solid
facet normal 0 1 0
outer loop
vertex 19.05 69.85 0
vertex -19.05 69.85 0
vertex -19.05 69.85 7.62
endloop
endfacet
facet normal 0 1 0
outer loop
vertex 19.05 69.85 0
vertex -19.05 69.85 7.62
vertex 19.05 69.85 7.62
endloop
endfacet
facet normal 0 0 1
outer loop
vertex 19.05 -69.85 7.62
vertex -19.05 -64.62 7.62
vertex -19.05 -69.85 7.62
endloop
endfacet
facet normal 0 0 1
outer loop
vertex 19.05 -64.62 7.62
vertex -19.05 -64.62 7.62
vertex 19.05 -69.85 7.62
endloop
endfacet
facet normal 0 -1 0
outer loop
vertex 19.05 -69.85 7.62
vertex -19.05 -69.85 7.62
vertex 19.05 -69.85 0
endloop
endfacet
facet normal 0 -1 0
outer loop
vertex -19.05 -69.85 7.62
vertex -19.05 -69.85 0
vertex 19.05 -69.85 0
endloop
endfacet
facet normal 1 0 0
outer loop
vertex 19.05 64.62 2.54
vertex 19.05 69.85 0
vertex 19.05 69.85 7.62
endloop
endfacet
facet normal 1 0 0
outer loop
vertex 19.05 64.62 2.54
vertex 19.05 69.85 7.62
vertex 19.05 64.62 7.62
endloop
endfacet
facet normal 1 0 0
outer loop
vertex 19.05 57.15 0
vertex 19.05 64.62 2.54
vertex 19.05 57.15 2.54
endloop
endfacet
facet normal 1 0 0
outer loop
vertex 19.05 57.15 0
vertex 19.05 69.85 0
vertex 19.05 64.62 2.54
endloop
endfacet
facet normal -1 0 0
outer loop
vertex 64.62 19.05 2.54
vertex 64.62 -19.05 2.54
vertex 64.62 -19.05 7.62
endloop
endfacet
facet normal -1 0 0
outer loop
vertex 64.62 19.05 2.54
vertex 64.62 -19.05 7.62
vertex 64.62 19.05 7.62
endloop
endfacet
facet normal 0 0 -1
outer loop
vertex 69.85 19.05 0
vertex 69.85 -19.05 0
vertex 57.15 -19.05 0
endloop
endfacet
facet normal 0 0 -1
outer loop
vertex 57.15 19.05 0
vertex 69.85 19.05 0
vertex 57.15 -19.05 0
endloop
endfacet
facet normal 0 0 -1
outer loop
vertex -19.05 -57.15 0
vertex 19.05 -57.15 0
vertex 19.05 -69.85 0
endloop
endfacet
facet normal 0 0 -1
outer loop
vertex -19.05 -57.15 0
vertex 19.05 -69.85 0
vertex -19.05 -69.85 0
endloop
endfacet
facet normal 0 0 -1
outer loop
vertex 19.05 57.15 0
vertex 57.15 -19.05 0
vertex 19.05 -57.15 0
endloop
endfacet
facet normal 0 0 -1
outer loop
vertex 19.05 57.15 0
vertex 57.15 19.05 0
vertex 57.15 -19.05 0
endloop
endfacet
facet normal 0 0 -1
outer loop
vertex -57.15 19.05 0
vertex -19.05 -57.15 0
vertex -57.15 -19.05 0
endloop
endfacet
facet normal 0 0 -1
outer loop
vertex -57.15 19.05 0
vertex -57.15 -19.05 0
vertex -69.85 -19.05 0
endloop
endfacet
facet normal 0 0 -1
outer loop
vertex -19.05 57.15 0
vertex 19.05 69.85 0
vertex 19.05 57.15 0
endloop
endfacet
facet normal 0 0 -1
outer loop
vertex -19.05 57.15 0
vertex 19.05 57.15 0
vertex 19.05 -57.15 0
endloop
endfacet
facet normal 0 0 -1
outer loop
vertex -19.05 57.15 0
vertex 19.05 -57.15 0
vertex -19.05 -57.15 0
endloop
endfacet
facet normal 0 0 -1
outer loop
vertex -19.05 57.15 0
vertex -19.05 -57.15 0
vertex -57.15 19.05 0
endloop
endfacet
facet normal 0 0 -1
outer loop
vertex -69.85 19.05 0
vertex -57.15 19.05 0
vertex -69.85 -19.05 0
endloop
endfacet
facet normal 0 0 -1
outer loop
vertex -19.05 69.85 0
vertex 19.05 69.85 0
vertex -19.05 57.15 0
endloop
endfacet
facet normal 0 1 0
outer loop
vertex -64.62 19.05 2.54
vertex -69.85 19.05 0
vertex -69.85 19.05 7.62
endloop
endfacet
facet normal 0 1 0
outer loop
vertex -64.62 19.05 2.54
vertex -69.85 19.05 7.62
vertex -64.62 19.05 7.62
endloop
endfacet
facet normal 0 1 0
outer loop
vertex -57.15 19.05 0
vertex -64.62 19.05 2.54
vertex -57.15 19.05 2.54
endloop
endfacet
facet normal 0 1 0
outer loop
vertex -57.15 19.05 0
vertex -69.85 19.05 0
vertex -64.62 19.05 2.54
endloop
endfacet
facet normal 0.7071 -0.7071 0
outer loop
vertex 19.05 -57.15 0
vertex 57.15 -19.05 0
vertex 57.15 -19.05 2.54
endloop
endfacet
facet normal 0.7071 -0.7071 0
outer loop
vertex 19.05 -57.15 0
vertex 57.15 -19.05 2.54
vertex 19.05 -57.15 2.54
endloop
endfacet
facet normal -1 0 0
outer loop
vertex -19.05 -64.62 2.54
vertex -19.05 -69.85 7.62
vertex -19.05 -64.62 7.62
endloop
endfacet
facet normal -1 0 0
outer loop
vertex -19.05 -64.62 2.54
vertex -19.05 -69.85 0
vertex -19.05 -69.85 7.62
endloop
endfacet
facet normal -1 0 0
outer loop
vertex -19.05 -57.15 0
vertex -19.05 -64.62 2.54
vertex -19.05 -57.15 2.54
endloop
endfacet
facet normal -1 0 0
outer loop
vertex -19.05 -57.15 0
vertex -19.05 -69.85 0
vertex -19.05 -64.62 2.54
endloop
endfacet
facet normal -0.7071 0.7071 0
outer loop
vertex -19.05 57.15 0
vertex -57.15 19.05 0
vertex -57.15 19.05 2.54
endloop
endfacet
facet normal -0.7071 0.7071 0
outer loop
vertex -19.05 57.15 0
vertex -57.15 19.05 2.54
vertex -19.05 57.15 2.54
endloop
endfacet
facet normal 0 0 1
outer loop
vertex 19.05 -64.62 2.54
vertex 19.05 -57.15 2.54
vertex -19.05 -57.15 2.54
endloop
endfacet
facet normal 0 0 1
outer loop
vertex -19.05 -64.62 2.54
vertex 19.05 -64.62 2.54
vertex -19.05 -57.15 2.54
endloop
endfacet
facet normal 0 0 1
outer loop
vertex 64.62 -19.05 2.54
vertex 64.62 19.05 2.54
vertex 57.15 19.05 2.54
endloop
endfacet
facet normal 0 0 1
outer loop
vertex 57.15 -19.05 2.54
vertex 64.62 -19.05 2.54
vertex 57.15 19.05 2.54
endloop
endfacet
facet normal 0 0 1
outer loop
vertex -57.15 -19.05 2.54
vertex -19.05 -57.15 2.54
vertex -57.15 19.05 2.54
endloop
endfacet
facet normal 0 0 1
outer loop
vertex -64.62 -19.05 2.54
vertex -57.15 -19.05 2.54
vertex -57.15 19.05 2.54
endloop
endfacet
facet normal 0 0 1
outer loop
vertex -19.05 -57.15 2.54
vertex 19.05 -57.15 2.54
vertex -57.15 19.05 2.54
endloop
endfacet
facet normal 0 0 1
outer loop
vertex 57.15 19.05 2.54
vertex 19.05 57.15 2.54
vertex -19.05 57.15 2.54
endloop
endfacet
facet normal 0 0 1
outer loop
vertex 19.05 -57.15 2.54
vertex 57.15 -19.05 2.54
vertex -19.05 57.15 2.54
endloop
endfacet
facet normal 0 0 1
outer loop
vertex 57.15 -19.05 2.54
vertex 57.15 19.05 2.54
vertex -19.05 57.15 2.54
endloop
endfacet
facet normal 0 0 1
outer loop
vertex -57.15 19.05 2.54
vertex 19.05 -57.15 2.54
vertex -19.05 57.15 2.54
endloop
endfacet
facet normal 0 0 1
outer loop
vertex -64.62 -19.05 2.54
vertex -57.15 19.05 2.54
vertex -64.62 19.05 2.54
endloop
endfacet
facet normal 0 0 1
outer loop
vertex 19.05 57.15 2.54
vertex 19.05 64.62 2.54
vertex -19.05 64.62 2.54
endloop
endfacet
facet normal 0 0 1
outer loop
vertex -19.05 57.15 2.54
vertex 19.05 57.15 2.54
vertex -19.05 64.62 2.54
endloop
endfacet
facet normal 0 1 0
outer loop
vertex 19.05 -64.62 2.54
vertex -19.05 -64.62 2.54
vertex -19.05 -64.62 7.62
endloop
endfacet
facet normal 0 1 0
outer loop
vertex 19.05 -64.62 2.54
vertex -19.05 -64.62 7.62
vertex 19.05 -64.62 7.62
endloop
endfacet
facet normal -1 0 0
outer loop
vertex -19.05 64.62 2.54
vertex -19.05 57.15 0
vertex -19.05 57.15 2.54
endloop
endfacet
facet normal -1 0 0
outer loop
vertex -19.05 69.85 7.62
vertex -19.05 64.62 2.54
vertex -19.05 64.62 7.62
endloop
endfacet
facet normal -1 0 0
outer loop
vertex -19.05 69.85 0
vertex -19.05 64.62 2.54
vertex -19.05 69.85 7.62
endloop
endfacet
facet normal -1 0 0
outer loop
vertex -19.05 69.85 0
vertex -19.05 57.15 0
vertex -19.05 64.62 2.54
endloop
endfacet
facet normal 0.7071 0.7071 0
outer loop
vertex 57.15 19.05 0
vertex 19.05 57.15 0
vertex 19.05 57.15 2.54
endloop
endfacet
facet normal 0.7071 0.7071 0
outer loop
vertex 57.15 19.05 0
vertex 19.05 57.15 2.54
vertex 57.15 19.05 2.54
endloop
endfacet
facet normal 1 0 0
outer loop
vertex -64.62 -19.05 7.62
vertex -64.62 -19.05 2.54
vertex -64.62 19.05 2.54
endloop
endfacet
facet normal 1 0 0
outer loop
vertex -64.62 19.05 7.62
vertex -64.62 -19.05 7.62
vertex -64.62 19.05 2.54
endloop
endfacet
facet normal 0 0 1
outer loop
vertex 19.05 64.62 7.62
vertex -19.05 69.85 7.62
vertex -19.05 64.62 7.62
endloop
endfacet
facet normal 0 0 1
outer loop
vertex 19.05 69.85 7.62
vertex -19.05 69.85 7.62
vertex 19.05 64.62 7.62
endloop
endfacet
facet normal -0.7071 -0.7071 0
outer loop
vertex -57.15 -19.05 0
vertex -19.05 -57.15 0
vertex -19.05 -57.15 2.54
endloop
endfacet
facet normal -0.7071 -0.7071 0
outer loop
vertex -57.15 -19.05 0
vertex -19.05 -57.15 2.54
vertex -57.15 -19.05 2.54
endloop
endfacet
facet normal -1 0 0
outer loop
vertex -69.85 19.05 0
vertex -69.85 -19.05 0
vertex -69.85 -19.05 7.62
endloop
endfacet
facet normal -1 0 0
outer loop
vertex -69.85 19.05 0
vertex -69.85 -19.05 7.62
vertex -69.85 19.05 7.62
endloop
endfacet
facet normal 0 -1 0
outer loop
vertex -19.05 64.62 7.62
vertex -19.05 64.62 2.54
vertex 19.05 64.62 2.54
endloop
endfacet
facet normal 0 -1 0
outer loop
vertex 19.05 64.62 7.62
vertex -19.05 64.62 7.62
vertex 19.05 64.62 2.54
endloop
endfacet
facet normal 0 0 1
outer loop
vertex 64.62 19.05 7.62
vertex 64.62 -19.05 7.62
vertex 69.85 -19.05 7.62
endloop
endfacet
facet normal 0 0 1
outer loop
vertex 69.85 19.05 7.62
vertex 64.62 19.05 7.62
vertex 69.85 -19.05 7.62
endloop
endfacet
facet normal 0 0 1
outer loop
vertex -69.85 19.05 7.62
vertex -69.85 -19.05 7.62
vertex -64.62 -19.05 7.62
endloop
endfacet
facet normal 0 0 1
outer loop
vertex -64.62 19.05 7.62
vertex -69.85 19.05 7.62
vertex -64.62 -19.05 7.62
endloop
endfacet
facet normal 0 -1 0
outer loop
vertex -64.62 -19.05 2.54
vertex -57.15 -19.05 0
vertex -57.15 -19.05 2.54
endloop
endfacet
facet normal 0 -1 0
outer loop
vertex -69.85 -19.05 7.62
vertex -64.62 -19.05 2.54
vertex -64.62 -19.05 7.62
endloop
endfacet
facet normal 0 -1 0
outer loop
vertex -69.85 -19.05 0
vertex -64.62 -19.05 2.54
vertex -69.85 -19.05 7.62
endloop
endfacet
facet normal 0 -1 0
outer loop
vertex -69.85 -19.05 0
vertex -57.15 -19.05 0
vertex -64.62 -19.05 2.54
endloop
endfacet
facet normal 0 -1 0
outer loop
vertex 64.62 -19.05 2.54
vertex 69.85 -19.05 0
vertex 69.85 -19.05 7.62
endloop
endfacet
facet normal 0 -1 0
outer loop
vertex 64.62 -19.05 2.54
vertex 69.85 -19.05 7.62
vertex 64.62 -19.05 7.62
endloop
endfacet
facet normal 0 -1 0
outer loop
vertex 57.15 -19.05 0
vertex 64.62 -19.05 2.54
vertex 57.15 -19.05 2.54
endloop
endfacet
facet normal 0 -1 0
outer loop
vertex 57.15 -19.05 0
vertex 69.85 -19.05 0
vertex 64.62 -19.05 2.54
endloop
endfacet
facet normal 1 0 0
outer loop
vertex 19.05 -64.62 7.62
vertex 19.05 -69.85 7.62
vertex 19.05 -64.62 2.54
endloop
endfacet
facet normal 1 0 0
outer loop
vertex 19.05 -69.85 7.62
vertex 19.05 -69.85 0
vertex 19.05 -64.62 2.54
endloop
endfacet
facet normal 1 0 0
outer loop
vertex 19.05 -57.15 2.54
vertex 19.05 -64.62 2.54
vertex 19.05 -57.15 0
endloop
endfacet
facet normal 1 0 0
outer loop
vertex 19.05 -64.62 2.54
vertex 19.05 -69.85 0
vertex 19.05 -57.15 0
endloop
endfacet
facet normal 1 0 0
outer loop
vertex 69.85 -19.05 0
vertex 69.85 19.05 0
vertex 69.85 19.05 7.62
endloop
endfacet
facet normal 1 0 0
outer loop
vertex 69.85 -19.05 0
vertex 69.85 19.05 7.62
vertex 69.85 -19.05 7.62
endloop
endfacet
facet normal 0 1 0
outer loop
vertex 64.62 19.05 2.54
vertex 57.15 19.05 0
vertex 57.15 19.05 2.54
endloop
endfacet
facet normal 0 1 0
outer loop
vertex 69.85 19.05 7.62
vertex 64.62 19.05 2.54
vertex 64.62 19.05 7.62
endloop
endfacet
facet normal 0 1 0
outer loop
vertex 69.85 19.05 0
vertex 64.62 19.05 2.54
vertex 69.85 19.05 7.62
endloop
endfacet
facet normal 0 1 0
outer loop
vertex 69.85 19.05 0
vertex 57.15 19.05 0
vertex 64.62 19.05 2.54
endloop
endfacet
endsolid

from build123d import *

# Parameters (mm, degrees)
BOSS_EXTRUDE1_DEPTH = 2.54
SKETCH2_W           = 38.1
SKETCH2_H           = 5.229692412
SKETCH2_W_2         = 5.229692412
SKETCH2_H_2         = 38.1
BOSS_EXTRUDE2_DEPTH = 5.08


with BuildPart() as part:
    # Sketch1 → Boss-Extrude1 (new body)
    with BuildSketch(Plane.XY):
        Polygon((57.15, 19.05), (69.85, 19.05), (69.85, -19.05), (57.15, -19.05), (19.05, -57.15), (19.05, -69.85), (-19.05, -69.85), (-19.05, -57.15), (-57.15, -19.05), (-69.85, -19.05), (-69.85, 19.05), (-57.15, 19.05), (-19.05, 57.15), (-19.05, 69.85), (19.05, 69.85), (19.05, 57.15), align=None)
    extrude(amount=BOSS_EXTRUDE1_DEPTH)

    # Sketch2 → Boss-Extrude2 (add)
    with BuildSketch(Plane.XY.offset(2.54)):
        with Locations((0, -67.235153794)):
            Rectangle(SKETCH2_W, SKETCH2_H)
        with Locations((-67.235153794, 0)):
            Rectangle(SKETCH2_W_2, SKETCH2_H_2)
        with Locations((0, 67.235153794)):
            Rectangle(SKETCH2_W, SKETCH2_H)
        with Locations((67.235153794, 0)):
            Rectangle(SKETCH2_W_2, SKETCH2_H_2)
    extrude(amount=BOSS_EXTRUDE2_DEPTH)


solid = part.part
